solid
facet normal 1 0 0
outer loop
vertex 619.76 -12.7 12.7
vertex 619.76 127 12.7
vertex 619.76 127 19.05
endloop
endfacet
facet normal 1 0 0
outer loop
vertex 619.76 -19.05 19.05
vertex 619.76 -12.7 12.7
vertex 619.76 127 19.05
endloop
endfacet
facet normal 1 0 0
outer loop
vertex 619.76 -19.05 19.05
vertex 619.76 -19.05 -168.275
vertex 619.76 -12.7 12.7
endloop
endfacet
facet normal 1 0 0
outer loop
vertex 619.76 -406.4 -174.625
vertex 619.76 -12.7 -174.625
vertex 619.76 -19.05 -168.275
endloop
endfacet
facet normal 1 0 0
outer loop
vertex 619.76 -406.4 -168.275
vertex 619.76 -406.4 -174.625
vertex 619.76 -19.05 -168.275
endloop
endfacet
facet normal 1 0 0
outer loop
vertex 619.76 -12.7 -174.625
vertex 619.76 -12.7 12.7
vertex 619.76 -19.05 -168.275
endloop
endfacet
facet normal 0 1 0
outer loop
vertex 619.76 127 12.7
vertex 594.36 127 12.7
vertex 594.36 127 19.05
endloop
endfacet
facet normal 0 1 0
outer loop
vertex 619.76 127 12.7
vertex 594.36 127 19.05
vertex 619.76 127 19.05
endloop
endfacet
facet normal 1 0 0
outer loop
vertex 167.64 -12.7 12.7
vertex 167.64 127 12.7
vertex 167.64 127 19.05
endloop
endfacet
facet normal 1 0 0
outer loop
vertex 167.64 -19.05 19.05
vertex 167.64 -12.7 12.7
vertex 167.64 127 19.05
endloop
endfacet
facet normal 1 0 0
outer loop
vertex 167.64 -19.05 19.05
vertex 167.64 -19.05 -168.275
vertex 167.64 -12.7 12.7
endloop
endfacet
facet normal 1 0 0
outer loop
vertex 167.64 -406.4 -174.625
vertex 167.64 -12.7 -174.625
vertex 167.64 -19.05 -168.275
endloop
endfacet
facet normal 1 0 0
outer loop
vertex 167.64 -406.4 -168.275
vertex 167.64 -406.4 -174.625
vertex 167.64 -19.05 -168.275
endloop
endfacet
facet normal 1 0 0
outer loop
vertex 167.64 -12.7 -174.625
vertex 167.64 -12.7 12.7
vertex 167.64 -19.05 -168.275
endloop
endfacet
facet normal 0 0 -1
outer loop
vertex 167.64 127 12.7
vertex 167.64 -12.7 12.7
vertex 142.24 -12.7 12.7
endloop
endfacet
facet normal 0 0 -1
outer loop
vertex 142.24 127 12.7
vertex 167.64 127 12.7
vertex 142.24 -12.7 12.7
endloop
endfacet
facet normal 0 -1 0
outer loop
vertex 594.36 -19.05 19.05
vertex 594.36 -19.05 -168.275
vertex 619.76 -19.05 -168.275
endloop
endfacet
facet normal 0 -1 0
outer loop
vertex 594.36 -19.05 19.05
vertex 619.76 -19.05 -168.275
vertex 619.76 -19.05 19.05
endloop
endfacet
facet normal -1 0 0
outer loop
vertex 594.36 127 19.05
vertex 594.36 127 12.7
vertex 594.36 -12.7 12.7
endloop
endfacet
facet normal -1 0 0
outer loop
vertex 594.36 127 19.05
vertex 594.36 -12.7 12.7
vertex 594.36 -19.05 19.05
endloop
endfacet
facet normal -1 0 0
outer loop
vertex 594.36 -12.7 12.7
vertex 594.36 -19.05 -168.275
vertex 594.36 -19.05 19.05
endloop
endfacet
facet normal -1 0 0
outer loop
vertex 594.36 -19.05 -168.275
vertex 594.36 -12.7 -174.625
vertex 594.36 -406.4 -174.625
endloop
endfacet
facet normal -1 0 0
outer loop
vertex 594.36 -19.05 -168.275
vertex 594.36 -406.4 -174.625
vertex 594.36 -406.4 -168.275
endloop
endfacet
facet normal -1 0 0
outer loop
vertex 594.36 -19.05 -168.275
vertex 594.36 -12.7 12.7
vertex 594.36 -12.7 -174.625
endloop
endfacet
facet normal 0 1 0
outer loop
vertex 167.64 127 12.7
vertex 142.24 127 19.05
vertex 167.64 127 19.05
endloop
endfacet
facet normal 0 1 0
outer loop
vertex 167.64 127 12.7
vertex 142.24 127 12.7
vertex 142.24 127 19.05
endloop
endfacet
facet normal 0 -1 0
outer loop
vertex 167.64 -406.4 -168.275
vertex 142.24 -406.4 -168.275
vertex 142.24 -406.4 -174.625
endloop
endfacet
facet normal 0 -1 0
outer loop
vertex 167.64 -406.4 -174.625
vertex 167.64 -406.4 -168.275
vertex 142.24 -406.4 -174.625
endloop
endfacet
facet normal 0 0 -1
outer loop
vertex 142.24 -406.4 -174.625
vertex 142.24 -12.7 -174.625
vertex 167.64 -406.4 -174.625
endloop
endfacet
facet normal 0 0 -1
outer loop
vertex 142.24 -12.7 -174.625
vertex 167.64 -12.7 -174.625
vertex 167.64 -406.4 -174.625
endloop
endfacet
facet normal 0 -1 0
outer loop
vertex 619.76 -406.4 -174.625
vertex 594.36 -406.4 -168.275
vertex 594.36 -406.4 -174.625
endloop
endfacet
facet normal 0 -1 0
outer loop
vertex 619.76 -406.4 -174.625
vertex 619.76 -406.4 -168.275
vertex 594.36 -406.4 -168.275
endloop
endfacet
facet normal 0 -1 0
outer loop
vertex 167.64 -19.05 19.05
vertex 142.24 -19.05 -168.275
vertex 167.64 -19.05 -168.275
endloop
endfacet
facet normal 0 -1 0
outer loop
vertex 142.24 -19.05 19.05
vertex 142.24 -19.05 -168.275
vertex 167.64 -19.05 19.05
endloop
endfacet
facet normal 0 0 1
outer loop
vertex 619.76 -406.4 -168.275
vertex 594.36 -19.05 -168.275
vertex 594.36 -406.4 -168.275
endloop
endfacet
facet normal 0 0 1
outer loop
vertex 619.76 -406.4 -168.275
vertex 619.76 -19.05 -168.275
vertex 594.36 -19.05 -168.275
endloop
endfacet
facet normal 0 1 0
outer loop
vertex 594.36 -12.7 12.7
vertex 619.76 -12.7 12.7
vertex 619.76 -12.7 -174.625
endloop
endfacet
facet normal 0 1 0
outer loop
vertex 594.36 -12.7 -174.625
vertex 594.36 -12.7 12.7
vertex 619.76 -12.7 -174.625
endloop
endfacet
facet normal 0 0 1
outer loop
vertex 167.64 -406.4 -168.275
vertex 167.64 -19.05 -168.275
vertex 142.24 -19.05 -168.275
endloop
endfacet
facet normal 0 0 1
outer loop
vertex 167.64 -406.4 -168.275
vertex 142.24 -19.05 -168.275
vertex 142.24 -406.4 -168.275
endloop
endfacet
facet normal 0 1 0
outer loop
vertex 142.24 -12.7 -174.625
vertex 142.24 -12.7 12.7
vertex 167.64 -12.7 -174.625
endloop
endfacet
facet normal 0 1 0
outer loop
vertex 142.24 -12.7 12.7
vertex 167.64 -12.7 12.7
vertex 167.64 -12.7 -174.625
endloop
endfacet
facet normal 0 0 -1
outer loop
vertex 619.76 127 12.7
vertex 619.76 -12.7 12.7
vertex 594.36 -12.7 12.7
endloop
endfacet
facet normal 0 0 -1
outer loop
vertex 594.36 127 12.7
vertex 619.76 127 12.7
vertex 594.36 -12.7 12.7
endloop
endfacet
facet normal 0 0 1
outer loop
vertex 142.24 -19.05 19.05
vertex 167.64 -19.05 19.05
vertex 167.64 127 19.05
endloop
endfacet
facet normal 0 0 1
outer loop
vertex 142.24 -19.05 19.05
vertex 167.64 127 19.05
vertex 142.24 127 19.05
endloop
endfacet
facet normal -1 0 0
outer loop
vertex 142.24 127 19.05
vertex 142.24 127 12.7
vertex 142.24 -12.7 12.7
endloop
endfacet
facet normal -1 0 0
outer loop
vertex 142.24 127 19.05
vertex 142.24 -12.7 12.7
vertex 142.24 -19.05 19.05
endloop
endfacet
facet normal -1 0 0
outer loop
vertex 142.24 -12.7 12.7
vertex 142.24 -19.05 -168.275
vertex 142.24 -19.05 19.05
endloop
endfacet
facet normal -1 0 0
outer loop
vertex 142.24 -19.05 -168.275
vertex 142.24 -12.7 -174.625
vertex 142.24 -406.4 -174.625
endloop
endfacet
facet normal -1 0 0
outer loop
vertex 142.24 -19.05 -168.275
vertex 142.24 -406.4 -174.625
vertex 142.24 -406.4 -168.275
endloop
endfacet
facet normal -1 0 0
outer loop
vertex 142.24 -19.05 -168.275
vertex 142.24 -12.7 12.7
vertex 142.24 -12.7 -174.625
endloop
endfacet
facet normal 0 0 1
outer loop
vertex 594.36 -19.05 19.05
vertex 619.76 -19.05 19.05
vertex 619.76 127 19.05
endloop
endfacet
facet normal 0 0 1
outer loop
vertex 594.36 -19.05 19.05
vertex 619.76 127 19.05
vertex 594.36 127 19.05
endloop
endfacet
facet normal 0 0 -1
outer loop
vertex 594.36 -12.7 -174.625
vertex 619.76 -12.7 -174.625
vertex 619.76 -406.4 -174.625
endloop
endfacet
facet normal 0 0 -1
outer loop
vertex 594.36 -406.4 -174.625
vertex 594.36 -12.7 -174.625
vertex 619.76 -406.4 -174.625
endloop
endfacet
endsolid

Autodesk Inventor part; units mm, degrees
ref_plane "YZ Plane" through (0, 0, 0) normal (1, 0, 0) x (0, 1, 0)
ref_plane "XZ Plane" through (0, 0, 0) normal (0, 1, 0) x (-1, 0, 0)
ref_plane "XY Plane" through (0, 0, 0) normal (0, 0, 1) x (1, 0, 0)
sketch "Sketch1" plane through (0, 0, 0) normal (0, 0, 1) x (1, 0, 0)
  line L0 (0, 0) -> (76.2, 0)
  line L1 (76.2, 0) -> (76.2, 76.2)
  line L2 (76.2, 76.2) -> (0, 76.2)
  line L3 (0, 76.2) -> (0, 0)
  line L4 (76.2, 76.2) -> (167.64, 76.2)
  line L5 (167.64, 76.2) -> (594.36, 76.2)
  line L6 (594.36, 76.2) -> (685.8, 76.2)
  line L7 (167.64, 76.2) -> (594.36, 76.2)
  line L8 (594.36, 76.2) -> (594.36, -406.4)
  line L9 (594.36, -406.4) -> (167.64, -406.4)
  line L10 (167.64, -406.4) -> (167.64, 76.2)
  line L11 (167.64, -406.4) -> (142.24, -406.4)
  line L12 (142.24, -406.4) -> (142.24, 76.2)
  line L13 (142.24, 76.2) -> (167.64, 76.2)
  line L14 (167.64, 76.2) -> (167.64, -406.4)
  line L15 (594.36, 76.2) -> (619.76, 76.2)
  line L16 (619.76, 76.2) -> (619.76, -406.4)
  line L17 (619.76, -406.4) -> (594.36, -406.4)
  line L18 (594.36, -406.4) -> (594.36, 76.2)
  dimension "d0" = 76.2
  dimension "d1" = 76.2
  dimension "d2" = 91.44
  dimension "d3" = 426.72
  dimension "d4" = 91.44
  dimension "d5" = 426.72
  dimension "d6" = 482.6
  dimension "d7" = 25.4
  dimension "d8" = 482.6
  dimension "d9" = 25.4
  dimension "d10" = 482.6
extrude "Extrusion1" add sketch "Sketch1" along normal blind 19.05 contours L4 L10 L11 L12 | L6 L16 L17 L8
sketch "Sketch2" plane through (142.24, -406.4, 0) normal (-1, 0, 0) x (0, 0, 1)
  line L0 (0, 482.6) -> (12.7, 482.6)
  line L1 (12.7, 482.6) -> (12.7, 0)
  line L2 (12.7, 0) -> (0, 0)
  line L3 (0, 0) -> (0, 482.6)
  point P0 (0, 406.4)
  dimension "d13" = 12.7
  dimension "d14" = 482.6
extrude "Extrusion2" cut sketch "Sketch2" against normal blind 2090.7375
sketch "Sketch3" plane through (619.76, -406.4, 19.05) normal (1, 0, 0) x (0, 0, -1)
  line L0 (19.05, 406.4) -> (6.35, 406.4)
  line L1 (6.35, 406.4) -> (6.35, 393.7)
  line L2 (6.35, 393.7) -> (19.05, 393.7)
  line L3 (19.05, 393.7) -> (19.05, 406.4)
  line L4 (6.35, 393.7) -> (193.675, 393.7)
  line L5 (193.675, 393.7) -> (193.675, 387.35)
  line L6 (193.675, 387.35) -> (6.35, 387.35)
  line L7 (6.35, 387.35) -> (6.35, 393.7)
  line L8 (193.675, 387.35) -> (187.325, 387.35)
  line L9 (187.325, 387.35) -> (187.325, 0)
  line L10 (187.325, 0) -> (193.675, 0)
  line L11 (193.675, 0) -> (193.675, 387.35)
  dimension "d17" = 12.7
  dimension "d18" = 12.7
  dimension "d19" = 187.325
  dimension "d20" = 6.35
  dimension "d21" = 6.35
  dimension "d22" = 387.35
extrude "Extrusion3" add sketch "Sketch3" against normal blind 477.52 contours L4 L5 L6 L7 L2 | L11 L10 L9 L6
sketch "Sketch4" plane through (142.24, -406.4, 19.05) normal (-1, 0, 0) x (0, 0, 1)
  line L0 (-6.35, 387.35) -> (0, 387.35)
  line L1 (0, 387.35) -> (0, 0)
  line L2 (0, 0) -> (-6.35, 0)
  line L3 (-6.35, 0) -> (-6.35, 387.35)
  point P0 (-19.05, 406.4)
extrude "Extrusion4" cut sketch "Sketch4" against normal blind 684.53
sketch "Sketch5" plane through (167.64, -19.05, 12.7) normal (0, 0, 1) x (1, 0, 0)
  line L0 (0, 0) -> (0, 6.35) projected
  line L1 (426.72, 0) -> (0, 0) projected
  line L2 (426.72, 6.35) -> (426.72, 0) projected
  line L3 (426.72, 6.35) -> (0, 6.35) projected
  point P0 (-167.64, 19.05)
extrude "Extrusion5" cut sketch "Sketch5" against normal blind 1007.745
sketch "Sketch6" plane through (619.76, -406.4, -168.275) normal (0, 0, 1) x (1, 0, 0)
  line L0 (0, 0) -> (-477.52, 0) projected
  line L1 (-452.12, 387.35) -> (-25.4, 387.35)
  line L2 (-25.4, 387.35) -> (-25.4, 0)
  line L3 (-25.4, 0) -> (-452.12, 0)
  line L4 (-452.12, 0) -> (-452.12, 387.35)
  point P0 (-619.76, 406.4)
extrude "Extrusion6" cut sketch "Sketch6" against normal blind 187.6425
sketch "Sketch7" plane through (594.36, 76.2, 19.05) normal (0, 1, 0) x (1, 0, 0)
  line L0 (25.4, 6.35) -> (0, 6.35) projected
  line L1 (0, 6.35) -> (0, 0) projected
  line L2 (25.4, 0) -> (0, 0) projected
  line L3 (25.4, 6.35) -> (25.4, 0) projected
  point P0 (-594.36, 19.05)
extrude "Extrusion7" add sketch "Sketch7" along normal blind 50.8
sketch "Sketch8" plane through (142.24, 76.2, 19.05) normal (0, 1, 0) x (1, 0, 0)
  line L0 (25.4, 6.35) -> (0, 6.35) projected
  line L1 (0, 6.35) -> (0, 0) projected
  line L2 (25.4, 0) -> (0, 0) projected
  line L3 (25.4, 6.35) -> (25.4, 0) projected
  point P0 (-142.24, 19.05)
extrude "Extrusion8" add sketch "Sketch8" along normal blind 50.8
properties part number "SideArm"
